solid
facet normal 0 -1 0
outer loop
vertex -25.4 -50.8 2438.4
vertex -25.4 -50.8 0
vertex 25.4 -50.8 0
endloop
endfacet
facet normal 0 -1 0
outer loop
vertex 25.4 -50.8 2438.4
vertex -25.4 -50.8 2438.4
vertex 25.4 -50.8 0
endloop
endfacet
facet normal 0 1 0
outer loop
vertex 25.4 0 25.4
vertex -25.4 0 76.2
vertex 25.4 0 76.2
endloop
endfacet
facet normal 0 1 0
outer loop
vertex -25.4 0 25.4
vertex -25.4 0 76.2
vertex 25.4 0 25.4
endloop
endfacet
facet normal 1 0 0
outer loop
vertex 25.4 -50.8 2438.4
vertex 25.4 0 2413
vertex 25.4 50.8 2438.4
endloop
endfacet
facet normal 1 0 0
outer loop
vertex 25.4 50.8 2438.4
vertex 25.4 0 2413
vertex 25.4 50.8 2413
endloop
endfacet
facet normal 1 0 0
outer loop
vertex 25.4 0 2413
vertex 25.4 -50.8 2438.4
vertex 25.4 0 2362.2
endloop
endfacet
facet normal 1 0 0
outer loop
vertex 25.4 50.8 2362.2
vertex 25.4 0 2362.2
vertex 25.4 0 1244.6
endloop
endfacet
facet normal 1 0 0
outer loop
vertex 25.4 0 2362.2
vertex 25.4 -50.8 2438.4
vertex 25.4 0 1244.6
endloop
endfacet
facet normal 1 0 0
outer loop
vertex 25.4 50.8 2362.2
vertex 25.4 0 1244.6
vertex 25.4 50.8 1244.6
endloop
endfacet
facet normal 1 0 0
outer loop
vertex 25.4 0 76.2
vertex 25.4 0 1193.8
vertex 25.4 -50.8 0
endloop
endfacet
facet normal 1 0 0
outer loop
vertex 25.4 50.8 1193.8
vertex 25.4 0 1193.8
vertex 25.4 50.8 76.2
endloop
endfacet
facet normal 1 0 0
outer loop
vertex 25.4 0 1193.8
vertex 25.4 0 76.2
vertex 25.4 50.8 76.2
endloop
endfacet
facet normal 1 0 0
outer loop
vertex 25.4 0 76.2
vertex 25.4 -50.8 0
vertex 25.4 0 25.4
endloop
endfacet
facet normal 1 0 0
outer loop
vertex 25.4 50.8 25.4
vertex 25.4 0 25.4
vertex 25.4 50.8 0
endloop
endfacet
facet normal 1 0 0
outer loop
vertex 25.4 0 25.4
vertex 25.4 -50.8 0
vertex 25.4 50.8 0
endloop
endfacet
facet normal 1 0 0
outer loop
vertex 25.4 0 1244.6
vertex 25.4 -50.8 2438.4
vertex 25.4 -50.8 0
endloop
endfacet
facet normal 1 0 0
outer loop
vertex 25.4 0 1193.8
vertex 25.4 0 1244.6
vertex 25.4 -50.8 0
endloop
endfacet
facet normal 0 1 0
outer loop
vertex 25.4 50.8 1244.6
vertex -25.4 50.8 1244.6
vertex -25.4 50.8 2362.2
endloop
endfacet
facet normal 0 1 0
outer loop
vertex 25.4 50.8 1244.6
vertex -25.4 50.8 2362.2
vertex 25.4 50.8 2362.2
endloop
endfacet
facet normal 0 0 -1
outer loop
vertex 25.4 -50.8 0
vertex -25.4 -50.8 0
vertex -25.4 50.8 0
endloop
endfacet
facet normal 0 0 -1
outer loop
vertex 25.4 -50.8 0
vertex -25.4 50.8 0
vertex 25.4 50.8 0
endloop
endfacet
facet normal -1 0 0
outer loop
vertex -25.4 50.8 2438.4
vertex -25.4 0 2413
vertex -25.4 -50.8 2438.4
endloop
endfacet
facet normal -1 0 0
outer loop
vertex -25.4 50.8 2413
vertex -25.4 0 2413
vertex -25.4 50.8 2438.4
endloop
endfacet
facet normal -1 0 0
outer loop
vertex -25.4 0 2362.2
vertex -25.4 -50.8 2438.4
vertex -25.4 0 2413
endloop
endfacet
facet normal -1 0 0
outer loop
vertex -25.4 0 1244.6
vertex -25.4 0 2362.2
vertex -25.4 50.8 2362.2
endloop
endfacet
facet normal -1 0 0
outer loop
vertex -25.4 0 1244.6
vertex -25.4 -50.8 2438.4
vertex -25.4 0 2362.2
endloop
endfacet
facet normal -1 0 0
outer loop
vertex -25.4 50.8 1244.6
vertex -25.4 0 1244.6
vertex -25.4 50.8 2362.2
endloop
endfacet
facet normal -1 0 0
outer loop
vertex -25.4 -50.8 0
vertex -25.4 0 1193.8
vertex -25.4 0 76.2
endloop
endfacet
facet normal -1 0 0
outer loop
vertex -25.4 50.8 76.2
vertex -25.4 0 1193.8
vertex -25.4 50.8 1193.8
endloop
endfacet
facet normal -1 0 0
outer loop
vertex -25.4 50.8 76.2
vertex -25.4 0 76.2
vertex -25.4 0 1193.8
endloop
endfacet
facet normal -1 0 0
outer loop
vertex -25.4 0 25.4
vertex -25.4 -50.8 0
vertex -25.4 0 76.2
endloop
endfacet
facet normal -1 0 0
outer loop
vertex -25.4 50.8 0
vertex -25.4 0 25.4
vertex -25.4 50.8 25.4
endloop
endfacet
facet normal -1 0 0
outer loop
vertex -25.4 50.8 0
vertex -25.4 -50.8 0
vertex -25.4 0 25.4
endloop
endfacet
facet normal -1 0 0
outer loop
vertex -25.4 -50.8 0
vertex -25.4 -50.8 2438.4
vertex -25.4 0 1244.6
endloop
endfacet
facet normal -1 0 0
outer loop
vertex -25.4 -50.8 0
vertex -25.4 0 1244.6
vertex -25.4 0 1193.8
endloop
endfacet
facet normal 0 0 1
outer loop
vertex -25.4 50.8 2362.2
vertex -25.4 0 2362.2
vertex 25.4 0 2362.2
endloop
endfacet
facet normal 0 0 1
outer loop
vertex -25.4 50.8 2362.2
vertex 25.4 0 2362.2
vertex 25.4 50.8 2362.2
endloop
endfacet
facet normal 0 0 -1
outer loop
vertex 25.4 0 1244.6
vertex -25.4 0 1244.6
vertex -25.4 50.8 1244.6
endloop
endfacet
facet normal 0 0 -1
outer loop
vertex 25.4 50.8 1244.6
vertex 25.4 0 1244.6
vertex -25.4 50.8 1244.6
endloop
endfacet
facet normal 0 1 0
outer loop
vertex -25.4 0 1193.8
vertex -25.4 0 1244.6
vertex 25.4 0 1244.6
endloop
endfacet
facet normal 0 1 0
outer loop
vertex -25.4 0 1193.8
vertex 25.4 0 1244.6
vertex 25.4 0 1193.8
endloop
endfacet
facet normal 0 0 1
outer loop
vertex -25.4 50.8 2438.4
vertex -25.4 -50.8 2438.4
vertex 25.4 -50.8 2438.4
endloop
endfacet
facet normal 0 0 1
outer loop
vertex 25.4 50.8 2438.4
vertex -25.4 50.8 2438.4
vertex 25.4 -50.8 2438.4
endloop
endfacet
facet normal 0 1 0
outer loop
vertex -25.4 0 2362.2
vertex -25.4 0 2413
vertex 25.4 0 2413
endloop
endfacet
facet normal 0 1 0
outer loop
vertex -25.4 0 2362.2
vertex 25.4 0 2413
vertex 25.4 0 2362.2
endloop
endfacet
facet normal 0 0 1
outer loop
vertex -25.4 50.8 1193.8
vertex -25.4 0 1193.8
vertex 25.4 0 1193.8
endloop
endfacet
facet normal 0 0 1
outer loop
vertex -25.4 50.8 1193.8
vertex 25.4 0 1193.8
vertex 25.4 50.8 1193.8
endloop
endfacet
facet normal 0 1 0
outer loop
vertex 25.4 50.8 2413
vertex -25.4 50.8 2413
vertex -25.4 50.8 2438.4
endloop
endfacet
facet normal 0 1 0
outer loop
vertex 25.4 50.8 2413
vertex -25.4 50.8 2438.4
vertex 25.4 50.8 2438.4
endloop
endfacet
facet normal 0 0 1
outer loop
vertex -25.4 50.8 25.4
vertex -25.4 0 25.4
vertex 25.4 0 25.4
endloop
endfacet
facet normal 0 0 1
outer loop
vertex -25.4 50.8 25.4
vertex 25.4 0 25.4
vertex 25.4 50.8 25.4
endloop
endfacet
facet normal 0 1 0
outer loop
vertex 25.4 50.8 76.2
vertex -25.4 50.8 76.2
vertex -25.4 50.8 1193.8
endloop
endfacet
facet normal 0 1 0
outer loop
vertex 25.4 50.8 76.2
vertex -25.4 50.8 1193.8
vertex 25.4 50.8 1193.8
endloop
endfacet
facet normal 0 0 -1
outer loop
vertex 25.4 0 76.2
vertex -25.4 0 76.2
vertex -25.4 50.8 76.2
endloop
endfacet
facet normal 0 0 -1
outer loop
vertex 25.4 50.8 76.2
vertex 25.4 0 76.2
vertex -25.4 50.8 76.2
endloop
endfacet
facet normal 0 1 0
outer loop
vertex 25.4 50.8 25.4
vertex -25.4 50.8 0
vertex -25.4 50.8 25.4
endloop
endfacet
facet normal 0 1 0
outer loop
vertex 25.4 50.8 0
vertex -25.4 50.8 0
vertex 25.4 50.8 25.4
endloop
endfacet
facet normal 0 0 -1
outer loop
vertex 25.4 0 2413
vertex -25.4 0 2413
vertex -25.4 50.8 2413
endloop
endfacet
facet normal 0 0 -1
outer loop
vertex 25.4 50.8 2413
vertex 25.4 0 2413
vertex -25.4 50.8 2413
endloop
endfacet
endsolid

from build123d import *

# Parameters (mm, degrees)
SKETCH1_W               = 50.8
SKETCH1_H               = 101.6
BOSS_EXTRUDE1_DEPTH     = 2438.4
CUT_EXTRUDE1_DEPTH      = 2440.45810376
CUT_EXTRUDE1_DEPTH_BACK = 2440.45810376
SKETCH2_W               = 50.8
SKETCH2_H               = 50.8


with BuildPart() as part:
    # Sketch1 → Boss-Extrude1 (new body)
    with BuildSketch(Plane.XY):
        Rectangle(SKETCH1_W, SKETCH1_H)
    extrude(amount=BOSS_EXTRUDE1_DEPTH)

    # Sketch2 → Cut-Extrude1 (cut, two sides: drawn at the far end of the back side and taken through both)
    with BuildSketch(Plane(origin=(25.4, 0, 0), x_dir=(0, 0, -1), z_dir=(1, 0, 0)).offset(-CUT_EXTRUDE1_DEPTH_BACK)):
        with Locations((-1219.2, 25.4)):
            Rectangle(SKETCH2_W, SKETCH2_H)
        with Locations((-2387.6, 25.4)):
            Rectangle(SKETCH2_W, SKETCH2_H)
        with Locations((-50.8, 25.4)):
            Rectangle(SKETCH2_W, SKETCH2_H)
    extrude(amount=CUT_EXTRUDE1_DEPTH + CUT_EXTRUDE1_DEPTH_BACK, mode=Mode.SUBTRACT)


solid = part.part
